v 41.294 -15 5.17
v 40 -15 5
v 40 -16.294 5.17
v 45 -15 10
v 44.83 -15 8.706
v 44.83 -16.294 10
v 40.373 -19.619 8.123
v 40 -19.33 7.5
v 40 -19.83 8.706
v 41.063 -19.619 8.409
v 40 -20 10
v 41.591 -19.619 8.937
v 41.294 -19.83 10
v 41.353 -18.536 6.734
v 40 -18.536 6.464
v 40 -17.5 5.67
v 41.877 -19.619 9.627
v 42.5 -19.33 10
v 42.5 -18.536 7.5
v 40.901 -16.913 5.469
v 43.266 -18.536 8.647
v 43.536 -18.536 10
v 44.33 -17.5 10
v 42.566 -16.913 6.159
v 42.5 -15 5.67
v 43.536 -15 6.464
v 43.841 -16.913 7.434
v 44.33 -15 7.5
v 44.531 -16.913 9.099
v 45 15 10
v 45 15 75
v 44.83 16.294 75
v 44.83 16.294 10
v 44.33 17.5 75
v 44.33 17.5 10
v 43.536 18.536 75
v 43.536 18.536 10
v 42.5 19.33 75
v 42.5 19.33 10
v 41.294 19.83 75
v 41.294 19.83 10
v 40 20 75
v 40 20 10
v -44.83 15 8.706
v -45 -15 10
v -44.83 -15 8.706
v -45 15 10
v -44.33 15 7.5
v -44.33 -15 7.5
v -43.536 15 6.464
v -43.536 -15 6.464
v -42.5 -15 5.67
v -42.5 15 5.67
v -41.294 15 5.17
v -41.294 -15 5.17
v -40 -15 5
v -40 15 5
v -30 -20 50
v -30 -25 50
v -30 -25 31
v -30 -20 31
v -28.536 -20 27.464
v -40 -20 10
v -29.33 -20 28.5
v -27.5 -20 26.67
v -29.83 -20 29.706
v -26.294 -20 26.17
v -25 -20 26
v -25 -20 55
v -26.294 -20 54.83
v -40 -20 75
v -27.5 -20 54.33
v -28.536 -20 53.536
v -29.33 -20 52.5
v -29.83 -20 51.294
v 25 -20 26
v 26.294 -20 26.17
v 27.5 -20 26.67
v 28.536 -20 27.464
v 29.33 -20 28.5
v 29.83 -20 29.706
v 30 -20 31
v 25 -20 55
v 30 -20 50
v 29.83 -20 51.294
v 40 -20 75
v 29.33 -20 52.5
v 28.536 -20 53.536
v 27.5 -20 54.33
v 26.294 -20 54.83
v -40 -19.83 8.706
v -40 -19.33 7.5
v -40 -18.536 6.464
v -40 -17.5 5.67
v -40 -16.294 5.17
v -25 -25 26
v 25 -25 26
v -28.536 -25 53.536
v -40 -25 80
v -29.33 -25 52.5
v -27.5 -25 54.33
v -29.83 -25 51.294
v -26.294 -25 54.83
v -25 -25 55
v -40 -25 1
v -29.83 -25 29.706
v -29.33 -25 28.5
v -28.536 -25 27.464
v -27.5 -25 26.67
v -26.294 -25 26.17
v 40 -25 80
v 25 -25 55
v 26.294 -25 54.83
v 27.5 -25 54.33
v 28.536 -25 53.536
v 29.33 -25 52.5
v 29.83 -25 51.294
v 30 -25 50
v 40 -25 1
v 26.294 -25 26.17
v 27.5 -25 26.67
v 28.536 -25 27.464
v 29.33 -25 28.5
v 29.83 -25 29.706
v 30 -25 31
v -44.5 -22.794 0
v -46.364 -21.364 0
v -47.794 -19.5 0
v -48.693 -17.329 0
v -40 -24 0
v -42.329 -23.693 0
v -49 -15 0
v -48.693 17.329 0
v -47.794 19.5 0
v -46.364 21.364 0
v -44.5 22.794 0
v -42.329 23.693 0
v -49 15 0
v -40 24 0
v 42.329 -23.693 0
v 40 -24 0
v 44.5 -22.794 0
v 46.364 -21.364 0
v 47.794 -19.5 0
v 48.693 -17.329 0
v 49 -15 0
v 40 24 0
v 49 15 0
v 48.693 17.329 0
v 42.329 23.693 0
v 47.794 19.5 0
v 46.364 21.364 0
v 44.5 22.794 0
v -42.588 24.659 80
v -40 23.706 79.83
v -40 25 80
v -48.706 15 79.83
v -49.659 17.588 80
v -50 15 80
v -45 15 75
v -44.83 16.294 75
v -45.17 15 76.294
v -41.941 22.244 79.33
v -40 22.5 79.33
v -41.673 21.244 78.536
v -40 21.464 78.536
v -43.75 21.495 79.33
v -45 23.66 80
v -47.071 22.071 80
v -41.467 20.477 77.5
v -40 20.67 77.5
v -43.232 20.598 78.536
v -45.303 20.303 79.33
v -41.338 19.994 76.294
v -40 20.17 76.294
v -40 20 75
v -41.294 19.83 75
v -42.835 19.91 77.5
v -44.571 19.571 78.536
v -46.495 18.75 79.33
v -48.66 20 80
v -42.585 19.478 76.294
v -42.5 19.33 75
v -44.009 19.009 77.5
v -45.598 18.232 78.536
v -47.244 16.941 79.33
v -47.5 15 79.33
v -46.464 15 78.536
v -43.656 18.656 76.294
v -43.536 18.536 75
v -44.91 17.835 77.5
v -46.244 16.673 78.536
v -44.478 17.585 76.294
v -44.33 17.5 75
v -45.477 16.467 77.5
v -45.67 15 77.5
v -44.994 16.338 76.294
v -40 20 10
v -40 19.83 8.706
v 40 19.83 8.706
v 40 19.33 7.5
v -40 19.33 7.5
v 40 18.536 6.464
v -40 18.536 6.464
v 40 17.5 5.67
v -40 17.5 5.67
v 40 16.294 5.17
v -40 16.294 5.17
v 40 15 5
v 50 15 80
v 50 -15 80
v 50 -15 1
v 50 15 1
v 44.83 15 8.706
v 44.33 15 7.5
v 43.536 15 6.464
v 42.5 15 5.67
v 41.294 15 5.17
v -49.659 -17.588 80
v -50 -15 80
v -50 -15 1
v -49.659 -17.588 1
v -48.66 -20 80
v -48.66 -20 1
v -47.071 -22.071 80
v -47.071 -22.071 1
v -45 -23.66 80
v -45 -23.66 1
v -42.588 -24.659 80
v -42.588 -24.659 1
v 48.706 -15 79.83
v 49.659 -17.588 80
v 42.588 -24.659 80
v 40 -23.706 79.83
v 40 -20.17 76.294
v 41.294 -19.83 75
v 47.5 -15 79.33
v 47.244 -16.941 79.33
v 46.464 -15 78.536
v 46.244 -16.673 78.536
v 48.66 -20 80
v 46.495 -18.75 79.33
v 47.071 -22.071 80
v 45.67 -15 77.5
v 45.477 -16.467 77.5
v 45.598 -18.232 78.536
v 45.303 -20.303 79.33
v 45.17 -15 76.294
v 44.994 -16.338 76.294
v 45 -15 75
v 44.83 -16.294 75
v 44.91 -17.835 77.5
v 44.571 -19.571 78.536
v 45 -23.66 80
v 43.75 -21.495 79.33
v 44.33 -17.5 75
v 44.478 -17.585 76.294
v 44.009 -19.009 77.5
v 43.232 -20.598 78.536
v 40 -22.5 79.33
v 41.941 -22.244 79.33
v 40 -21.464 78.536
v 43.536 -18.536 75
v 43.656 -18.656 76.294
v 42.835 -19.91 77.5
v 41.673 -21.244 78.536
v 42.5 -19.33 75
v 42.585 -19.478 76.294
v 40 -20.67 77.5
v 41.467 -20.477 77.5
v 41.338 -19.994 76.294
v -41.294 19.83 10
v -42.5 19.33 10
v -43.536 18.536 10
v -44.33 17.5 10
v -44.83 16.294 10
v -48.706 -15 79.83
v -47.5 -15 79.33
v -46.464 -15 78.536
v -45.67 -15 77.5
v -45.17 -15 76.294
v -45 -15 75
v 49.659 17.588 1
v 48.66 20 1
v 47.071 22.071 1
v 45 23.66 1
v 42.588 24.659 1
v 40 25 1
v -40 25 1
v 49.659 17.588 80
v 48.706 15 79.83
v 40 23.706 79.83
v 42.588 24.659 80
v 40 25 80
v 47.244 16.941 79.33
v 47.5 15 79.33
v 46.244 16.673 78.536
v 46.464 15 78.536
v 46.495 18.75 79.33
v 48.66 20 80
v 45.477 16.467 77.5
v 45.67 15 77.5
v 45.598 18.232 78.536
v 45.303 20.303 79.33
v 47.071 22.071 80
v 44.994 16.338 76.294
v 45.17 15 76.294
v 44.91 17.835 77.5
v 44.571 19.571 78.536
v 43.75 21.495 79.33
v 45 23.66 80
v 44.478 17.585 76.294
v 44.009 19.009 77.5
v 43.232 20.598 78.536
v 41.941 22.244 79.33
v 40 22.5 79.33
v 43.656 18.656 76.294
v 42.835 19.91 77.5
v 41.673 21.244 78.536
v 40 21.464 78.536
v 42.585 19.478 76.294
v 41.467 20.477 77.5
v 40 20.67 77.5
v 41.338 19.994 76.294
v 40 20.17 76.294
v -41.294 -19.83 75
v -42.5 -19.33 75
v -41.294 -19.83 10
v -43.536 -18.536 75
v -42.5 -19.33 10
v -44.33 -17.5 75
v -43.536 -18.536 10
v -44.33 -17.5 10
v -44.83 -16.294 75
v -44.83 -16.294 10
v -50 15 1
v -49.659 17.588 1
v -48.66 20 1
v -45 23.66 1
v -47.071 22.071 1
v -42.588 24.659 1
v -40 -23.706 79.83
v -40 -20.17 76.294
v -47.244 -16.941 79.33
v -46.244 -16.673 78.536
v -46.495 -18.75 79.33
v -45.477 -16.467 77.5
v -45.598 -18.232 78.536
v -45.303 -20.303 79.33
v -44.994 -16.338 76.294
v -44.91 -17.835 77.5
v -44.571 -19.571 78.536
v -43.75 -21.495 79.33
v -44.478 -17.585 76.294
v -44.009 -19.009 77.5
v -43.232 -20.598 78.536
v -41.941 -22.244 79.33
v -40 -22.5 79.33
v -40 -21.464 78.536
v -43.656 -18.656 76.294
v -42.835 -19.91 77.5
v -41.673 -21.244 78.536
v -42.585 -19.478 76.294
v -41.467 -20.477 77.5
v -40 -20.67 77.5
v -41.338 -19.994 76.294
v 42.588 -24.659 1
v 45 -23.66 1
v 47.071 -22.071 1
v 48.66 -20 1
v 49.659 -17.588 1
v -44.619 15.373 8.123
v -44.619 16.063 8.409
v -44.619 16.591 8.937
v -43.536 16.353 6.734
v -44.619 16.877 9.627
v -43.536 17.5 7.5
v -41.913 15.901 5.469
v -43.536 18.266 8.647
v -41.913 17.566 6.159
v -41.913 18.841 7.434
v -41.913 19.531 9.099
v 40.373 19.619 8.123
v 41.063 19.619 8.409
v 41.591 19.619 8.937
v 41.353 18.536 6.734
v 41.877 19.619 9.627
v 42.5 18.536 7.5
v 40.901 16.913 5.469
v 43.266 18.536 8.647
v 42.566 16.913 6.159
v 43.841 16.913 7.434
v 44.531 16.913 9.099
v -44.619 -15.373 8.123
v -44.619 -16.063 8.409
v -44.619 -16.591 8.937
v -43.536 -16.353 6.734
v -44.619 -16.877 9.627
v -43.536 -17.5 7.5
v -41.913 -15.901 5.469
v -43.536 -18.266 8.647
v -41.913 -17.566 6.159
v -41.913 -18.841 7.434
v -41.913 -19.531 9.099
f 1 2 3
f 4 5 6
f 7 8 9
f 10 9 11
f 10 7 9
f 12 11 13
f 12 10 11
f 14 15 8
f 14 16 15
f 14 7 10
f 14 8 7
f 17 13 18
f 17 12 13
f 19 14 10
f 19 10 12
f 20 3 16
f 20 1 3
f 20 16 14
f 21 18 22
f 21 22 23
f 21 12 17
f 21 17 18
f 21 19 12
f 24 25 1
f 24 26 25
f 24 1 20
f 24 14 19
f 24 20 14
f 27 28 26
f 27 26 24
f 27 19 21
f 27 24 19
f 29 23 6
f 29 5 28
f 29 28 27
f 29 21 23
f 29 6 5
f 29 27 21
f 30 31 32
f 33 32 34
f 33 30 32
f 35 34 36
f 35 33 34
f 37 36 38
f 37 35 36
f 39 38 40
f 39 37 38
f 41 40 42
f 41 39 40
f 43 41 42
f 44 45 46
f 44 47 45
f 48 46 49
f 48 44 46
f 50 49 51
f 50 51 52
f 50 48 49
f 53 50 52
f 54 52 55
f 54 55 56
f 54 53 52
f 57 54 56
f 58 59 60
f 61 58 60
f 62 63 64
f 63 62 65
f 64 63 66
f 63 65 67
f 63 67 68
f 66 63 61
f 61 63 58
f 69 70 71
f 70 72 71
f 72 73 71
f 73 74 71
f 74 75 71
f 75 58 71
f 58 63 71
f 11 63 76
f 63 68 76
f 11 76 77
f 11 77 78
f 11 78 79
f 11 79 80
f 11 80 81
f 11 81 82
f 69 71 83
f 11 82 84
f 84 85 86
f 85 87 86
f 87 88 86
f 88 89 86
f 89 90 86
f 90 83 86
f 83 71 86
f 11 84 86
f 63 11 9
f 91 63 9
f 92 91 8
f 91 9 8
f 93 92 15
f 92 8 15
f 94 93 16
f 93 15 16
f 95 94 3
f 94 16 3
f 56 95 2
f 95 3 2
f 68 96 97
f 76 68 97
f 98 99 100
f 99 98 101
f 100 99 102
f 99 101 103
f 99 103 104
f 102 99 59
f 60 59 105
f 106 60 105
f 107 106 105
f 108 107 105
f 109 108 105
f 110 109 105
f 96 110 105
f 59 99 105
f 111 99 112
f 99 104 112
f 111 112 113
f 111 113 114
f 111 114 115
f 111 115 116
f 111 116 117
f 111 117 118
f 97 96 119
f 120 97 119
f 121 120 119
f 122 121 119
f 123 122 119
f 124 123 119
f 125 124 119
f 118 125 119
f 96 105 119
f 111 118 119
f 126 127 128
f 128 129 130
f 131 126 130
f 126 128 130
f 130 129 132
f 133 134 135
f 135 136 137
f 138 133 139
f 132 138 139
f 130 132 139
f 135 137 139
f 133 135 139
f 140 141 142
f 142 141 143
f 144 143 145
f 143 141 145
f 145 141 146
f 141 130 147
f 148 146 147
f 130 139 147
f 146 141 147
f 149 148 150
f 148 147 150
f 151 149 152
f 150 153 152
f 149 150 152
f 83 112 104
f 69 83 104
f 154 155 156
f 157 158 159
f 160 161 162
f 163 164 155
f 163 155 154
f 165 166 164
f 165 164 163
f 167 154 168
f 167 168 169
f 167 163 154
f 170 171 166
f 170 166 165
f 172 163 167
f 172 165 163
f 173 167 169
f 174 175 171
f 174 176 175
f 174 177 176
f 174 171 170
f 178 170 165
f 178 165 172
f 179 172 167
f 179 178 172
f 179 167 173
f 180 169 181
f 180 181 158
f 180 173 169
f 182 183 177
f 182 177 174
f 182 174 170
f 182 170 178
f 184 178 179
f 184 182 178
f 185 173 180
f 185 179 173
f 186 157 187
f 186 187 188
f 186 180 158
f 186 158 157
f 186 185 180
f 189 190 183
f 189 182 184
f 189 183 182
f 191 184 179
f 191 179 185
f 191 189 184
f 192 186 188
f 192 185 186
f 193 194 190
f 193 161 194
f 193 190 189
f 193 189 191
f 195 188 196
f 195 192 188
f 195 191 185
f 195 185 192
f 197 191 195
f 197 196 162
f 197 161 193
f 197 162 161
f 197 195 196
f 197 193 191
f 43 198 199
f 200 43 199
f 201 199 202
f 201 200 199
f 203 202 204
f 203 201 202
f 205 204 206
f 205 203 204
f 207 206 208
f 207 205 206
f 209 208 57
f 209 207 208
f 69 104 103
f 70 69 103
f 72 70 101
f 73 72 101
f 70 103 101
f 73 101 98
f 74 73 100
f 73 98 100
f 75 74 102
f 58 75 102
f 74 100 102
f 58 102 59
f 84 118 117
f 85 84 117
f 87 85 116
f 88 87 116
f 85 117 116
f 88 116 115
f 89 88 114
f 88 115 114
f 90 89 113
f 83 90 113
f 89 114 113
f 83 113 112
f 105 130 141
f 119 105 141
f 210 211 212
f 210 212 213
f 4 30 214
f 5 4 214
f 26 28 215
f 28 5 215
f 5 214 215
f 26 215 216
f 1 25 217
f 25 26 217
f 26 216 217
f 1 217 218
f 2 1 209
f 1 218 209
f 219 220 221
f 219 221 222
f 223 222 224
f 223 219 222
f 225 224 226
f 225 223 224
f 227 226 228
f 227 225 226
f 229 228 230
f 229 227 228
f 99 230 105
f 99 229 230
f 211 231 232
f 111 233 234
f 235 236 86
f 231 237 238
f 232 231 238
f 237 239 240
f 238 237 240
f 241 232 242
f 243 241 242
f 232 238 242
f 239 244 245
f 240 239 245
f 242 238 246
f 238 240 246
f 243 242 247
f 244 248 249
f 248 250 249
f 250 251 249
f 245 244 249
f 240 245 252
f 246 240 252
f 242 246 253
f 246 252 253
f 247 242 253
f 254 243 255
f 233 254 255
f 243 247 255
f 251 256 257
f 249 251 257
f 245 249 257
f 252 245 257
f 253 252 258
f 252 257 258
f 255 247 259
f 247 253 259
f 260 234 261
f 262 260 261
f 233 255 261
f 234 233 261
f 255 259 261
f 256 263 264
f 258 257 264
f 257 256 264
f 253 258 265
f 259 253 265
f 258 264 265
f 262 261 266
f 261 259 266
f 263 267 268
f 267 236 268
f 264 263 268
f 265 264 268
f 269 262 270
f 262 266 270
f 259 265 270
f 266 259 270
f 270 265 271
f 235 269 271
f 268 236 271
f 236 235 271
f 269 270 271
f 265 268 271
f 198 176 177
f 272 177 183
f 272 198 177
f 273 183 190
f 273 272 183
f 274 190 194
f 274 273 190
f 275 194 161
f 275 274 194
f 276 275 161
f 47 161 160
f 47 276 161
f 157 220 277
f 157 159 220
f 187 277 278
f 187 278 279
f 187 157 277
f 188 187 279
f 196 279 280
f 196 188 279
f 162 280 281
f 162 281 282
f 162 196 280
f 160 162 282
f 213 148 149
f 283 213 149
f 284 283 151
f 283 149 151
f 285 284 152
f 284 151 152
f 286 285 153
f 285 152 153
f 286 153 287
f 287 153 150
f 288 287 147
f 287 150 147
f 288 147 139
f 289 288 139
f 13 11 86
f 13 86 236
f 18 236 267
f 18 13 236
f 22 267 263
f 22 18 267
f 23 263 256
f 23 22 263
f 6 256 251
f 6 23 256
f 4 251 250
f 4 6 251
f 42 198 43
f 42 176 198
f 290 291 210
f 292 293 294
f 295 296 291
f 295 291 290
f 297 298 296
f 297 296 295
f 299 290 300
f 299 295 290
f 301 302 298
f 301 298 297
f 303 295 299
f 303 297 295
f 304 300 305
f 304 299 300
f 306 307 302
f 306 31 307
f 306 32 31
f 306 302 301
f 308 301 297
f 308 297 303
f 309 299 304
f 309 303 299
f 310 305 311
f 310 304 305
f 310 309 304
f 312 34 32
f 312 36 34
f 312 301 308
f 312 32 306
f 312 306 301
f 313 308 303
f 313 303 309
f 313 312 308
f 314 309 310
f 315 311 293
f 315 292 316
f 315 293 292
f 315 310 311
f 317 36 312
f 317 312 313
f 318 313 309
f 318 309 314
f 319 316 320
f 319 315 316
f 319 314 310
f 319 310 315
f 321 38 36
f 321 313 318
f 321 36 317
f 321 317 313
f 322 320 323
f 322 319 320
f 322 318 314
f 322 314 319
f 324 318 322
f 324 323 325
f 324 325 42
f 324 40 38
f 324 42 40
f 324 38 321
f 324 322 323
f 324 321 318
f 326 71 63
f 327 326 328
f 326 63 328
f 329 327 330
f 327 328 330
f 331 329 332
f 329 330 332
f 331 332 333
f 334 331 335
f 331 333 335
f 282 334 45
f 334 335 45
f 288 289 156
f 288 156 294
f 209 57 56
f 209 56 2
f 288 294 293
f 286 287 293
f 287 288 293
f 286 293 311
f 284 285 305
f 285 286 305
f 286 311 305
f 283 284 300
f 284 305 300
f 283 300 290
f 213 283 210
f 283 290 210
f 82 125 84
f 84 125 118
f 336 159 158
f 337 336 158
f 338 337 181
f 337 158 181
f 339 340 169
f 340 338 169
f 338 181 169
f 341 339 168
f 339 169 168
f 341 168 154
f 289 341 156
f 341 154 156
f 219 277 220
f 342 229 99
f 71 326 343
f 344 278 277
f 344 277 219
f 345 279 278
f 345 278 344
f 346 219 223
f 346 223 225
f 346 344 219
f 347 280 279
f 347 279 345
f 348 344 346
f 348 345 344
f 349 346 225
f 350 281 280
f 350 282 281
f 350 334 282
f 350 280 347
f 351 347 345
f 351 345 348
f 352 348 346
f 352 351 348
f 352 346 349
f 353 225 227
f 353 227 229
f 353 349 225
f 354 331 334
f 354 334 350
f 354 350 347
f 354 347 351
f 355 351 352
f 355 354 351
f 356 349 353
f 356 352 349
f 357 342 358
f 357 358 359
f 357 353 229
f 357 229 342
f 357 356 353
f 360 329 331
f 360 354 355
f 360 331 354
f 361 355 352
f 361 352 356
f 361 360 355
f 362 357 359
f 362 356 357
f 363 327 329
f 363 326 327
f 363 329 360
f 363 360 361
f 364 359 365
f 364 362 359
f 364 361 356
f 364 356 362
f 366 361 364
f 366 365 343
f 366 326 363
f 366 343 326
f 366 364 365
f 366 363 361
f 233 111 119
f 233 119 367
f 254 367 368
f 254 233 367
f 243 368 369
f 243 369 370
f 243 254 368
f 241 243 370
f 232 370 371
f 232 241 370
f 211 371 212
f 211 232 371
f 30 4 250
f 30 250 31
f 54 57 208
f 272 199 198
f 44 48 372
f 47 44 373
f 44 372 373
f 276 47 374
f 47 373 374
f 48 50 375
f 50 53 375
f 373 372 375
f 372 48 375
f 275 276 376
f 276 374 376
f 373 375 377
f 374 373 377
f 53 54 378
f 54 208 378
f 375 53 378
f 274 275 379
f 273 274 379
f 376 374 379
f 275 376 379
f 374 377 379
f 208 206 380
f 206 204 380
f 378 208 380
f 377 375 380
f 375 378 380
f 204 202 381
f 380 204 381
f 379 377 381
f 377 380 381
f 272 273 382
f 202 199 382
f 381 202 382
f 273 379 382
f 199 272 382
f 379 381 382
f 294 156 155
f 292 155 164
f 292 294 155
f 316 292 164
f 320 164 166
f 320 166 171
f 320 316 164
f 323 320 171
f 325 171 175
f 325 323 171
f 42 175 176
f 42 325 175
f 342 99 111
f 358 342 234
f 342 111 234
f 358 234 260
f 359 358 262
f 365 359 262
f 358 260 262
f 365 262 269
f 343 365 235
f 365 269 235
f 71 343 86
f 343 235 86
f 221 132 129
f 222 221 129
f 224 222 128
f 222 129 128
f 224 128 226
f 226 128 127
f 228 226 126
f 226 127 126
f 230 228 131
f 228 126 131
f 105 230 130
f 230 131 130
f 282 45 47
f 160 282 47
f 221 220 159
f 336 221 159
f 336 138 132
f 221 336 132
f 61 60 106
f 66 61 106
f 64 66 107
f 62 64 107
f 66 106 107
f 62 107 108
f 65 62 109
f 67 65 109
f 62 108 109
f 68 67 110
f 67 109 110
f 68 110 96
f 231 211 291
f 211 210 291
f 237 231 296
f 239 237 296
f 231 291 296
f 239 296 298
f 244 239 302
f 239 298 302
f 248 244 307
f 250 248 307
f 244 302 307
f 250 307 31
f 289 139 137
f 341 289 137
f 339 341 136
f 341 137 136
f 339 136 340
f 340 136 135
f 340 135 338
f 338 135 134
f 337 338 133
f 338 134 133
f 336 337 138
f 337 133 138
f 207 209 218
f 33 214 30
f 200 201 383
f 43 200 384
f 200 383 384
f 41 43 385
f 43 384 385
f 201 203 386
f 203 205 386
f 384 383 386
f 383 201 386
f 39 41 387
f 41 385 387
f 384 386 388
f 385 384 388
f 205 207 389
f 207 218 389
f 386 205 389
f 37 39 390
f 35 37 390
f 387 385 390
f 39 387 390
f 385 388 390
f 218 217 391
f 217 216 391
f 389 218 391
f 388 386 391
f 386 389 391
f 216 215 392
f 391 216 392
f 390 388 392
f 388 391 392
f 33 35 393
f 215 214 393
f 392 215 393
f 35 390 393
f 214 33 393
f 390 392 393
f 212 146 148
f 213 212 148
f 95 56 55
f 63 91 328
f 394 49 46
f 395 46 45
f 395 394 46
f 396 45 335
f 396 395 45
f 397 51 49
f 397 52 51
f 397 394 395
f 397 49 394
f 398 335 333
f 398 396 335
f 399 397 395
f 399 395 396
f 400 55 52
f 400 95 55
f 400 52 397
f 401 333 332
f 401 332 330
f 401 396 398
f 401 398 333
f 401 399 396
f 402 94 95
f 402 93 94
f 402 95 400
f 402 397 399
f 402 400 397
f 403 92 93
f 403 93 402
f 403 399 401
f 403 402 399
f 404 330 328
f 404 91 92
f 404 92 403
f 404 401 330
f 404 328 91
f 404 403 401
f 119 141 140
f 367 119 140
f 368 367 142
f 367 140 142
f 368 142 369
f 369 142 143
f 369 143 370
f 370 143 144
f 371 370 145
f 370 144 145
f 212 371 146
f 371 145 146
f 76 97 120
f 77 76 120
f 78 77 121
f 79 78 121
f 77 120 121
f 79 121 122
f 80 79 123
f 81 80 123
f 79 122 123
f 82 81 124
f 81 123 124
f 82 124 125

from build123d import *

# Parameters (mm, degrees)
F0_W     = 100
F0_H     = 50
F1_DEPTH = 80
F2_W     = 90
F2_H     = 40
F3_DEPTH = 75
F4_R     = 4.99999
F5_R     = 10
F6_SIZE  = 1
F8_DEPTH = 5


# Not quite as in the source:
# - a fillet or chamfer is up to 0.001 mm smaller than in the source, because OpenCascade refuses the exact size


with BuildPart() as f1:
    # F0 (on Top) → F1 (new body)
    with BuildSketch(Plane.XY):
        Rectangle(F0_W, F0_H)
    extrude(amount=F1_DEPTH)

    # F2 (on face) → F3 (cut)
    with BuildSketch(Plane.XY.offset(80)):
        Rectangle(F2_W, F2_H)
    extrude(amount=-F3_DEPTH, mode=Mode.SUBTRACT)

    # F4 (radius 5 in the source; OpenCascade refuses exactly that, so slightly less here)
    f4_edges = [f1.edges().sort_by_distance(p)[0] for p in [
        (45, 0, 5),
        (0, 20, 5),
        (0, -20, 5),
        (-45, 0, 5),
        (-45, 20, 42.5),
        (-45, -20, 42.5),
        (45, 20, 42.5),
        (45, -20, 42.5),
        (45, 0, 80),
        (0, 20, 80),
        (-45, 0, 80),
        (0, -20, 80),
    ]]
    fillet(f4_edges, radius=F4_R)

    # F5
    f5_edges = [f1.edges().sort_by_distance(p)[0] for p in [
        (50, -25, 40),
        (-50, -25, 40),
        (-50, 25, 40),
        (50, 25, 40),
    ]]
    fillet(f5_edges, radius=F5_R)

    # F6
    f6_edges = [f1.edges().sort_by_distance(p)[0] for p in [
        (0, -25, 0),
        (47.071068, -22.071068, 0),
        (50, 0, 0),
        (47.071068, 22.071068, 0),
        (0, 25, 0),
        (-47.071068, 22.071068, 0),
        (-50, 0, 0),
        (-47.071068, -22.071068, 0),
    ]]
    chamfer(f6_edges, length=F6_SIZE)

    # F7 (on face) → F8 (cut)
    with BuildSketch(Plane.XZ.offset(25)):
        with BuildLine():
            Line((25, 55), (-25, 55))
            ThreePointArc((-25, 55), (-28.5355339059, 53.5355339059), (-30, 50))
            Line((-30, 50), (-30, 31))
            ThreePointArc((-30, 31), (-28.5355339059, 27.4644660941), (-25, 26))
            Line((-25, 26), (25, 26))
            ThreePointArc((25, 26), (28.5355339059, 27.4644660941), (30, 31))
            Line((30, 31), (30, 50))
            ThreePointArc((30, 50), (28.5355339059, 53.5355339059), (25, 55))
        make_face()
    extrude(amount=-F8_DEPTH, mode=Mode.SUBTRACT)


solid = f1.part
